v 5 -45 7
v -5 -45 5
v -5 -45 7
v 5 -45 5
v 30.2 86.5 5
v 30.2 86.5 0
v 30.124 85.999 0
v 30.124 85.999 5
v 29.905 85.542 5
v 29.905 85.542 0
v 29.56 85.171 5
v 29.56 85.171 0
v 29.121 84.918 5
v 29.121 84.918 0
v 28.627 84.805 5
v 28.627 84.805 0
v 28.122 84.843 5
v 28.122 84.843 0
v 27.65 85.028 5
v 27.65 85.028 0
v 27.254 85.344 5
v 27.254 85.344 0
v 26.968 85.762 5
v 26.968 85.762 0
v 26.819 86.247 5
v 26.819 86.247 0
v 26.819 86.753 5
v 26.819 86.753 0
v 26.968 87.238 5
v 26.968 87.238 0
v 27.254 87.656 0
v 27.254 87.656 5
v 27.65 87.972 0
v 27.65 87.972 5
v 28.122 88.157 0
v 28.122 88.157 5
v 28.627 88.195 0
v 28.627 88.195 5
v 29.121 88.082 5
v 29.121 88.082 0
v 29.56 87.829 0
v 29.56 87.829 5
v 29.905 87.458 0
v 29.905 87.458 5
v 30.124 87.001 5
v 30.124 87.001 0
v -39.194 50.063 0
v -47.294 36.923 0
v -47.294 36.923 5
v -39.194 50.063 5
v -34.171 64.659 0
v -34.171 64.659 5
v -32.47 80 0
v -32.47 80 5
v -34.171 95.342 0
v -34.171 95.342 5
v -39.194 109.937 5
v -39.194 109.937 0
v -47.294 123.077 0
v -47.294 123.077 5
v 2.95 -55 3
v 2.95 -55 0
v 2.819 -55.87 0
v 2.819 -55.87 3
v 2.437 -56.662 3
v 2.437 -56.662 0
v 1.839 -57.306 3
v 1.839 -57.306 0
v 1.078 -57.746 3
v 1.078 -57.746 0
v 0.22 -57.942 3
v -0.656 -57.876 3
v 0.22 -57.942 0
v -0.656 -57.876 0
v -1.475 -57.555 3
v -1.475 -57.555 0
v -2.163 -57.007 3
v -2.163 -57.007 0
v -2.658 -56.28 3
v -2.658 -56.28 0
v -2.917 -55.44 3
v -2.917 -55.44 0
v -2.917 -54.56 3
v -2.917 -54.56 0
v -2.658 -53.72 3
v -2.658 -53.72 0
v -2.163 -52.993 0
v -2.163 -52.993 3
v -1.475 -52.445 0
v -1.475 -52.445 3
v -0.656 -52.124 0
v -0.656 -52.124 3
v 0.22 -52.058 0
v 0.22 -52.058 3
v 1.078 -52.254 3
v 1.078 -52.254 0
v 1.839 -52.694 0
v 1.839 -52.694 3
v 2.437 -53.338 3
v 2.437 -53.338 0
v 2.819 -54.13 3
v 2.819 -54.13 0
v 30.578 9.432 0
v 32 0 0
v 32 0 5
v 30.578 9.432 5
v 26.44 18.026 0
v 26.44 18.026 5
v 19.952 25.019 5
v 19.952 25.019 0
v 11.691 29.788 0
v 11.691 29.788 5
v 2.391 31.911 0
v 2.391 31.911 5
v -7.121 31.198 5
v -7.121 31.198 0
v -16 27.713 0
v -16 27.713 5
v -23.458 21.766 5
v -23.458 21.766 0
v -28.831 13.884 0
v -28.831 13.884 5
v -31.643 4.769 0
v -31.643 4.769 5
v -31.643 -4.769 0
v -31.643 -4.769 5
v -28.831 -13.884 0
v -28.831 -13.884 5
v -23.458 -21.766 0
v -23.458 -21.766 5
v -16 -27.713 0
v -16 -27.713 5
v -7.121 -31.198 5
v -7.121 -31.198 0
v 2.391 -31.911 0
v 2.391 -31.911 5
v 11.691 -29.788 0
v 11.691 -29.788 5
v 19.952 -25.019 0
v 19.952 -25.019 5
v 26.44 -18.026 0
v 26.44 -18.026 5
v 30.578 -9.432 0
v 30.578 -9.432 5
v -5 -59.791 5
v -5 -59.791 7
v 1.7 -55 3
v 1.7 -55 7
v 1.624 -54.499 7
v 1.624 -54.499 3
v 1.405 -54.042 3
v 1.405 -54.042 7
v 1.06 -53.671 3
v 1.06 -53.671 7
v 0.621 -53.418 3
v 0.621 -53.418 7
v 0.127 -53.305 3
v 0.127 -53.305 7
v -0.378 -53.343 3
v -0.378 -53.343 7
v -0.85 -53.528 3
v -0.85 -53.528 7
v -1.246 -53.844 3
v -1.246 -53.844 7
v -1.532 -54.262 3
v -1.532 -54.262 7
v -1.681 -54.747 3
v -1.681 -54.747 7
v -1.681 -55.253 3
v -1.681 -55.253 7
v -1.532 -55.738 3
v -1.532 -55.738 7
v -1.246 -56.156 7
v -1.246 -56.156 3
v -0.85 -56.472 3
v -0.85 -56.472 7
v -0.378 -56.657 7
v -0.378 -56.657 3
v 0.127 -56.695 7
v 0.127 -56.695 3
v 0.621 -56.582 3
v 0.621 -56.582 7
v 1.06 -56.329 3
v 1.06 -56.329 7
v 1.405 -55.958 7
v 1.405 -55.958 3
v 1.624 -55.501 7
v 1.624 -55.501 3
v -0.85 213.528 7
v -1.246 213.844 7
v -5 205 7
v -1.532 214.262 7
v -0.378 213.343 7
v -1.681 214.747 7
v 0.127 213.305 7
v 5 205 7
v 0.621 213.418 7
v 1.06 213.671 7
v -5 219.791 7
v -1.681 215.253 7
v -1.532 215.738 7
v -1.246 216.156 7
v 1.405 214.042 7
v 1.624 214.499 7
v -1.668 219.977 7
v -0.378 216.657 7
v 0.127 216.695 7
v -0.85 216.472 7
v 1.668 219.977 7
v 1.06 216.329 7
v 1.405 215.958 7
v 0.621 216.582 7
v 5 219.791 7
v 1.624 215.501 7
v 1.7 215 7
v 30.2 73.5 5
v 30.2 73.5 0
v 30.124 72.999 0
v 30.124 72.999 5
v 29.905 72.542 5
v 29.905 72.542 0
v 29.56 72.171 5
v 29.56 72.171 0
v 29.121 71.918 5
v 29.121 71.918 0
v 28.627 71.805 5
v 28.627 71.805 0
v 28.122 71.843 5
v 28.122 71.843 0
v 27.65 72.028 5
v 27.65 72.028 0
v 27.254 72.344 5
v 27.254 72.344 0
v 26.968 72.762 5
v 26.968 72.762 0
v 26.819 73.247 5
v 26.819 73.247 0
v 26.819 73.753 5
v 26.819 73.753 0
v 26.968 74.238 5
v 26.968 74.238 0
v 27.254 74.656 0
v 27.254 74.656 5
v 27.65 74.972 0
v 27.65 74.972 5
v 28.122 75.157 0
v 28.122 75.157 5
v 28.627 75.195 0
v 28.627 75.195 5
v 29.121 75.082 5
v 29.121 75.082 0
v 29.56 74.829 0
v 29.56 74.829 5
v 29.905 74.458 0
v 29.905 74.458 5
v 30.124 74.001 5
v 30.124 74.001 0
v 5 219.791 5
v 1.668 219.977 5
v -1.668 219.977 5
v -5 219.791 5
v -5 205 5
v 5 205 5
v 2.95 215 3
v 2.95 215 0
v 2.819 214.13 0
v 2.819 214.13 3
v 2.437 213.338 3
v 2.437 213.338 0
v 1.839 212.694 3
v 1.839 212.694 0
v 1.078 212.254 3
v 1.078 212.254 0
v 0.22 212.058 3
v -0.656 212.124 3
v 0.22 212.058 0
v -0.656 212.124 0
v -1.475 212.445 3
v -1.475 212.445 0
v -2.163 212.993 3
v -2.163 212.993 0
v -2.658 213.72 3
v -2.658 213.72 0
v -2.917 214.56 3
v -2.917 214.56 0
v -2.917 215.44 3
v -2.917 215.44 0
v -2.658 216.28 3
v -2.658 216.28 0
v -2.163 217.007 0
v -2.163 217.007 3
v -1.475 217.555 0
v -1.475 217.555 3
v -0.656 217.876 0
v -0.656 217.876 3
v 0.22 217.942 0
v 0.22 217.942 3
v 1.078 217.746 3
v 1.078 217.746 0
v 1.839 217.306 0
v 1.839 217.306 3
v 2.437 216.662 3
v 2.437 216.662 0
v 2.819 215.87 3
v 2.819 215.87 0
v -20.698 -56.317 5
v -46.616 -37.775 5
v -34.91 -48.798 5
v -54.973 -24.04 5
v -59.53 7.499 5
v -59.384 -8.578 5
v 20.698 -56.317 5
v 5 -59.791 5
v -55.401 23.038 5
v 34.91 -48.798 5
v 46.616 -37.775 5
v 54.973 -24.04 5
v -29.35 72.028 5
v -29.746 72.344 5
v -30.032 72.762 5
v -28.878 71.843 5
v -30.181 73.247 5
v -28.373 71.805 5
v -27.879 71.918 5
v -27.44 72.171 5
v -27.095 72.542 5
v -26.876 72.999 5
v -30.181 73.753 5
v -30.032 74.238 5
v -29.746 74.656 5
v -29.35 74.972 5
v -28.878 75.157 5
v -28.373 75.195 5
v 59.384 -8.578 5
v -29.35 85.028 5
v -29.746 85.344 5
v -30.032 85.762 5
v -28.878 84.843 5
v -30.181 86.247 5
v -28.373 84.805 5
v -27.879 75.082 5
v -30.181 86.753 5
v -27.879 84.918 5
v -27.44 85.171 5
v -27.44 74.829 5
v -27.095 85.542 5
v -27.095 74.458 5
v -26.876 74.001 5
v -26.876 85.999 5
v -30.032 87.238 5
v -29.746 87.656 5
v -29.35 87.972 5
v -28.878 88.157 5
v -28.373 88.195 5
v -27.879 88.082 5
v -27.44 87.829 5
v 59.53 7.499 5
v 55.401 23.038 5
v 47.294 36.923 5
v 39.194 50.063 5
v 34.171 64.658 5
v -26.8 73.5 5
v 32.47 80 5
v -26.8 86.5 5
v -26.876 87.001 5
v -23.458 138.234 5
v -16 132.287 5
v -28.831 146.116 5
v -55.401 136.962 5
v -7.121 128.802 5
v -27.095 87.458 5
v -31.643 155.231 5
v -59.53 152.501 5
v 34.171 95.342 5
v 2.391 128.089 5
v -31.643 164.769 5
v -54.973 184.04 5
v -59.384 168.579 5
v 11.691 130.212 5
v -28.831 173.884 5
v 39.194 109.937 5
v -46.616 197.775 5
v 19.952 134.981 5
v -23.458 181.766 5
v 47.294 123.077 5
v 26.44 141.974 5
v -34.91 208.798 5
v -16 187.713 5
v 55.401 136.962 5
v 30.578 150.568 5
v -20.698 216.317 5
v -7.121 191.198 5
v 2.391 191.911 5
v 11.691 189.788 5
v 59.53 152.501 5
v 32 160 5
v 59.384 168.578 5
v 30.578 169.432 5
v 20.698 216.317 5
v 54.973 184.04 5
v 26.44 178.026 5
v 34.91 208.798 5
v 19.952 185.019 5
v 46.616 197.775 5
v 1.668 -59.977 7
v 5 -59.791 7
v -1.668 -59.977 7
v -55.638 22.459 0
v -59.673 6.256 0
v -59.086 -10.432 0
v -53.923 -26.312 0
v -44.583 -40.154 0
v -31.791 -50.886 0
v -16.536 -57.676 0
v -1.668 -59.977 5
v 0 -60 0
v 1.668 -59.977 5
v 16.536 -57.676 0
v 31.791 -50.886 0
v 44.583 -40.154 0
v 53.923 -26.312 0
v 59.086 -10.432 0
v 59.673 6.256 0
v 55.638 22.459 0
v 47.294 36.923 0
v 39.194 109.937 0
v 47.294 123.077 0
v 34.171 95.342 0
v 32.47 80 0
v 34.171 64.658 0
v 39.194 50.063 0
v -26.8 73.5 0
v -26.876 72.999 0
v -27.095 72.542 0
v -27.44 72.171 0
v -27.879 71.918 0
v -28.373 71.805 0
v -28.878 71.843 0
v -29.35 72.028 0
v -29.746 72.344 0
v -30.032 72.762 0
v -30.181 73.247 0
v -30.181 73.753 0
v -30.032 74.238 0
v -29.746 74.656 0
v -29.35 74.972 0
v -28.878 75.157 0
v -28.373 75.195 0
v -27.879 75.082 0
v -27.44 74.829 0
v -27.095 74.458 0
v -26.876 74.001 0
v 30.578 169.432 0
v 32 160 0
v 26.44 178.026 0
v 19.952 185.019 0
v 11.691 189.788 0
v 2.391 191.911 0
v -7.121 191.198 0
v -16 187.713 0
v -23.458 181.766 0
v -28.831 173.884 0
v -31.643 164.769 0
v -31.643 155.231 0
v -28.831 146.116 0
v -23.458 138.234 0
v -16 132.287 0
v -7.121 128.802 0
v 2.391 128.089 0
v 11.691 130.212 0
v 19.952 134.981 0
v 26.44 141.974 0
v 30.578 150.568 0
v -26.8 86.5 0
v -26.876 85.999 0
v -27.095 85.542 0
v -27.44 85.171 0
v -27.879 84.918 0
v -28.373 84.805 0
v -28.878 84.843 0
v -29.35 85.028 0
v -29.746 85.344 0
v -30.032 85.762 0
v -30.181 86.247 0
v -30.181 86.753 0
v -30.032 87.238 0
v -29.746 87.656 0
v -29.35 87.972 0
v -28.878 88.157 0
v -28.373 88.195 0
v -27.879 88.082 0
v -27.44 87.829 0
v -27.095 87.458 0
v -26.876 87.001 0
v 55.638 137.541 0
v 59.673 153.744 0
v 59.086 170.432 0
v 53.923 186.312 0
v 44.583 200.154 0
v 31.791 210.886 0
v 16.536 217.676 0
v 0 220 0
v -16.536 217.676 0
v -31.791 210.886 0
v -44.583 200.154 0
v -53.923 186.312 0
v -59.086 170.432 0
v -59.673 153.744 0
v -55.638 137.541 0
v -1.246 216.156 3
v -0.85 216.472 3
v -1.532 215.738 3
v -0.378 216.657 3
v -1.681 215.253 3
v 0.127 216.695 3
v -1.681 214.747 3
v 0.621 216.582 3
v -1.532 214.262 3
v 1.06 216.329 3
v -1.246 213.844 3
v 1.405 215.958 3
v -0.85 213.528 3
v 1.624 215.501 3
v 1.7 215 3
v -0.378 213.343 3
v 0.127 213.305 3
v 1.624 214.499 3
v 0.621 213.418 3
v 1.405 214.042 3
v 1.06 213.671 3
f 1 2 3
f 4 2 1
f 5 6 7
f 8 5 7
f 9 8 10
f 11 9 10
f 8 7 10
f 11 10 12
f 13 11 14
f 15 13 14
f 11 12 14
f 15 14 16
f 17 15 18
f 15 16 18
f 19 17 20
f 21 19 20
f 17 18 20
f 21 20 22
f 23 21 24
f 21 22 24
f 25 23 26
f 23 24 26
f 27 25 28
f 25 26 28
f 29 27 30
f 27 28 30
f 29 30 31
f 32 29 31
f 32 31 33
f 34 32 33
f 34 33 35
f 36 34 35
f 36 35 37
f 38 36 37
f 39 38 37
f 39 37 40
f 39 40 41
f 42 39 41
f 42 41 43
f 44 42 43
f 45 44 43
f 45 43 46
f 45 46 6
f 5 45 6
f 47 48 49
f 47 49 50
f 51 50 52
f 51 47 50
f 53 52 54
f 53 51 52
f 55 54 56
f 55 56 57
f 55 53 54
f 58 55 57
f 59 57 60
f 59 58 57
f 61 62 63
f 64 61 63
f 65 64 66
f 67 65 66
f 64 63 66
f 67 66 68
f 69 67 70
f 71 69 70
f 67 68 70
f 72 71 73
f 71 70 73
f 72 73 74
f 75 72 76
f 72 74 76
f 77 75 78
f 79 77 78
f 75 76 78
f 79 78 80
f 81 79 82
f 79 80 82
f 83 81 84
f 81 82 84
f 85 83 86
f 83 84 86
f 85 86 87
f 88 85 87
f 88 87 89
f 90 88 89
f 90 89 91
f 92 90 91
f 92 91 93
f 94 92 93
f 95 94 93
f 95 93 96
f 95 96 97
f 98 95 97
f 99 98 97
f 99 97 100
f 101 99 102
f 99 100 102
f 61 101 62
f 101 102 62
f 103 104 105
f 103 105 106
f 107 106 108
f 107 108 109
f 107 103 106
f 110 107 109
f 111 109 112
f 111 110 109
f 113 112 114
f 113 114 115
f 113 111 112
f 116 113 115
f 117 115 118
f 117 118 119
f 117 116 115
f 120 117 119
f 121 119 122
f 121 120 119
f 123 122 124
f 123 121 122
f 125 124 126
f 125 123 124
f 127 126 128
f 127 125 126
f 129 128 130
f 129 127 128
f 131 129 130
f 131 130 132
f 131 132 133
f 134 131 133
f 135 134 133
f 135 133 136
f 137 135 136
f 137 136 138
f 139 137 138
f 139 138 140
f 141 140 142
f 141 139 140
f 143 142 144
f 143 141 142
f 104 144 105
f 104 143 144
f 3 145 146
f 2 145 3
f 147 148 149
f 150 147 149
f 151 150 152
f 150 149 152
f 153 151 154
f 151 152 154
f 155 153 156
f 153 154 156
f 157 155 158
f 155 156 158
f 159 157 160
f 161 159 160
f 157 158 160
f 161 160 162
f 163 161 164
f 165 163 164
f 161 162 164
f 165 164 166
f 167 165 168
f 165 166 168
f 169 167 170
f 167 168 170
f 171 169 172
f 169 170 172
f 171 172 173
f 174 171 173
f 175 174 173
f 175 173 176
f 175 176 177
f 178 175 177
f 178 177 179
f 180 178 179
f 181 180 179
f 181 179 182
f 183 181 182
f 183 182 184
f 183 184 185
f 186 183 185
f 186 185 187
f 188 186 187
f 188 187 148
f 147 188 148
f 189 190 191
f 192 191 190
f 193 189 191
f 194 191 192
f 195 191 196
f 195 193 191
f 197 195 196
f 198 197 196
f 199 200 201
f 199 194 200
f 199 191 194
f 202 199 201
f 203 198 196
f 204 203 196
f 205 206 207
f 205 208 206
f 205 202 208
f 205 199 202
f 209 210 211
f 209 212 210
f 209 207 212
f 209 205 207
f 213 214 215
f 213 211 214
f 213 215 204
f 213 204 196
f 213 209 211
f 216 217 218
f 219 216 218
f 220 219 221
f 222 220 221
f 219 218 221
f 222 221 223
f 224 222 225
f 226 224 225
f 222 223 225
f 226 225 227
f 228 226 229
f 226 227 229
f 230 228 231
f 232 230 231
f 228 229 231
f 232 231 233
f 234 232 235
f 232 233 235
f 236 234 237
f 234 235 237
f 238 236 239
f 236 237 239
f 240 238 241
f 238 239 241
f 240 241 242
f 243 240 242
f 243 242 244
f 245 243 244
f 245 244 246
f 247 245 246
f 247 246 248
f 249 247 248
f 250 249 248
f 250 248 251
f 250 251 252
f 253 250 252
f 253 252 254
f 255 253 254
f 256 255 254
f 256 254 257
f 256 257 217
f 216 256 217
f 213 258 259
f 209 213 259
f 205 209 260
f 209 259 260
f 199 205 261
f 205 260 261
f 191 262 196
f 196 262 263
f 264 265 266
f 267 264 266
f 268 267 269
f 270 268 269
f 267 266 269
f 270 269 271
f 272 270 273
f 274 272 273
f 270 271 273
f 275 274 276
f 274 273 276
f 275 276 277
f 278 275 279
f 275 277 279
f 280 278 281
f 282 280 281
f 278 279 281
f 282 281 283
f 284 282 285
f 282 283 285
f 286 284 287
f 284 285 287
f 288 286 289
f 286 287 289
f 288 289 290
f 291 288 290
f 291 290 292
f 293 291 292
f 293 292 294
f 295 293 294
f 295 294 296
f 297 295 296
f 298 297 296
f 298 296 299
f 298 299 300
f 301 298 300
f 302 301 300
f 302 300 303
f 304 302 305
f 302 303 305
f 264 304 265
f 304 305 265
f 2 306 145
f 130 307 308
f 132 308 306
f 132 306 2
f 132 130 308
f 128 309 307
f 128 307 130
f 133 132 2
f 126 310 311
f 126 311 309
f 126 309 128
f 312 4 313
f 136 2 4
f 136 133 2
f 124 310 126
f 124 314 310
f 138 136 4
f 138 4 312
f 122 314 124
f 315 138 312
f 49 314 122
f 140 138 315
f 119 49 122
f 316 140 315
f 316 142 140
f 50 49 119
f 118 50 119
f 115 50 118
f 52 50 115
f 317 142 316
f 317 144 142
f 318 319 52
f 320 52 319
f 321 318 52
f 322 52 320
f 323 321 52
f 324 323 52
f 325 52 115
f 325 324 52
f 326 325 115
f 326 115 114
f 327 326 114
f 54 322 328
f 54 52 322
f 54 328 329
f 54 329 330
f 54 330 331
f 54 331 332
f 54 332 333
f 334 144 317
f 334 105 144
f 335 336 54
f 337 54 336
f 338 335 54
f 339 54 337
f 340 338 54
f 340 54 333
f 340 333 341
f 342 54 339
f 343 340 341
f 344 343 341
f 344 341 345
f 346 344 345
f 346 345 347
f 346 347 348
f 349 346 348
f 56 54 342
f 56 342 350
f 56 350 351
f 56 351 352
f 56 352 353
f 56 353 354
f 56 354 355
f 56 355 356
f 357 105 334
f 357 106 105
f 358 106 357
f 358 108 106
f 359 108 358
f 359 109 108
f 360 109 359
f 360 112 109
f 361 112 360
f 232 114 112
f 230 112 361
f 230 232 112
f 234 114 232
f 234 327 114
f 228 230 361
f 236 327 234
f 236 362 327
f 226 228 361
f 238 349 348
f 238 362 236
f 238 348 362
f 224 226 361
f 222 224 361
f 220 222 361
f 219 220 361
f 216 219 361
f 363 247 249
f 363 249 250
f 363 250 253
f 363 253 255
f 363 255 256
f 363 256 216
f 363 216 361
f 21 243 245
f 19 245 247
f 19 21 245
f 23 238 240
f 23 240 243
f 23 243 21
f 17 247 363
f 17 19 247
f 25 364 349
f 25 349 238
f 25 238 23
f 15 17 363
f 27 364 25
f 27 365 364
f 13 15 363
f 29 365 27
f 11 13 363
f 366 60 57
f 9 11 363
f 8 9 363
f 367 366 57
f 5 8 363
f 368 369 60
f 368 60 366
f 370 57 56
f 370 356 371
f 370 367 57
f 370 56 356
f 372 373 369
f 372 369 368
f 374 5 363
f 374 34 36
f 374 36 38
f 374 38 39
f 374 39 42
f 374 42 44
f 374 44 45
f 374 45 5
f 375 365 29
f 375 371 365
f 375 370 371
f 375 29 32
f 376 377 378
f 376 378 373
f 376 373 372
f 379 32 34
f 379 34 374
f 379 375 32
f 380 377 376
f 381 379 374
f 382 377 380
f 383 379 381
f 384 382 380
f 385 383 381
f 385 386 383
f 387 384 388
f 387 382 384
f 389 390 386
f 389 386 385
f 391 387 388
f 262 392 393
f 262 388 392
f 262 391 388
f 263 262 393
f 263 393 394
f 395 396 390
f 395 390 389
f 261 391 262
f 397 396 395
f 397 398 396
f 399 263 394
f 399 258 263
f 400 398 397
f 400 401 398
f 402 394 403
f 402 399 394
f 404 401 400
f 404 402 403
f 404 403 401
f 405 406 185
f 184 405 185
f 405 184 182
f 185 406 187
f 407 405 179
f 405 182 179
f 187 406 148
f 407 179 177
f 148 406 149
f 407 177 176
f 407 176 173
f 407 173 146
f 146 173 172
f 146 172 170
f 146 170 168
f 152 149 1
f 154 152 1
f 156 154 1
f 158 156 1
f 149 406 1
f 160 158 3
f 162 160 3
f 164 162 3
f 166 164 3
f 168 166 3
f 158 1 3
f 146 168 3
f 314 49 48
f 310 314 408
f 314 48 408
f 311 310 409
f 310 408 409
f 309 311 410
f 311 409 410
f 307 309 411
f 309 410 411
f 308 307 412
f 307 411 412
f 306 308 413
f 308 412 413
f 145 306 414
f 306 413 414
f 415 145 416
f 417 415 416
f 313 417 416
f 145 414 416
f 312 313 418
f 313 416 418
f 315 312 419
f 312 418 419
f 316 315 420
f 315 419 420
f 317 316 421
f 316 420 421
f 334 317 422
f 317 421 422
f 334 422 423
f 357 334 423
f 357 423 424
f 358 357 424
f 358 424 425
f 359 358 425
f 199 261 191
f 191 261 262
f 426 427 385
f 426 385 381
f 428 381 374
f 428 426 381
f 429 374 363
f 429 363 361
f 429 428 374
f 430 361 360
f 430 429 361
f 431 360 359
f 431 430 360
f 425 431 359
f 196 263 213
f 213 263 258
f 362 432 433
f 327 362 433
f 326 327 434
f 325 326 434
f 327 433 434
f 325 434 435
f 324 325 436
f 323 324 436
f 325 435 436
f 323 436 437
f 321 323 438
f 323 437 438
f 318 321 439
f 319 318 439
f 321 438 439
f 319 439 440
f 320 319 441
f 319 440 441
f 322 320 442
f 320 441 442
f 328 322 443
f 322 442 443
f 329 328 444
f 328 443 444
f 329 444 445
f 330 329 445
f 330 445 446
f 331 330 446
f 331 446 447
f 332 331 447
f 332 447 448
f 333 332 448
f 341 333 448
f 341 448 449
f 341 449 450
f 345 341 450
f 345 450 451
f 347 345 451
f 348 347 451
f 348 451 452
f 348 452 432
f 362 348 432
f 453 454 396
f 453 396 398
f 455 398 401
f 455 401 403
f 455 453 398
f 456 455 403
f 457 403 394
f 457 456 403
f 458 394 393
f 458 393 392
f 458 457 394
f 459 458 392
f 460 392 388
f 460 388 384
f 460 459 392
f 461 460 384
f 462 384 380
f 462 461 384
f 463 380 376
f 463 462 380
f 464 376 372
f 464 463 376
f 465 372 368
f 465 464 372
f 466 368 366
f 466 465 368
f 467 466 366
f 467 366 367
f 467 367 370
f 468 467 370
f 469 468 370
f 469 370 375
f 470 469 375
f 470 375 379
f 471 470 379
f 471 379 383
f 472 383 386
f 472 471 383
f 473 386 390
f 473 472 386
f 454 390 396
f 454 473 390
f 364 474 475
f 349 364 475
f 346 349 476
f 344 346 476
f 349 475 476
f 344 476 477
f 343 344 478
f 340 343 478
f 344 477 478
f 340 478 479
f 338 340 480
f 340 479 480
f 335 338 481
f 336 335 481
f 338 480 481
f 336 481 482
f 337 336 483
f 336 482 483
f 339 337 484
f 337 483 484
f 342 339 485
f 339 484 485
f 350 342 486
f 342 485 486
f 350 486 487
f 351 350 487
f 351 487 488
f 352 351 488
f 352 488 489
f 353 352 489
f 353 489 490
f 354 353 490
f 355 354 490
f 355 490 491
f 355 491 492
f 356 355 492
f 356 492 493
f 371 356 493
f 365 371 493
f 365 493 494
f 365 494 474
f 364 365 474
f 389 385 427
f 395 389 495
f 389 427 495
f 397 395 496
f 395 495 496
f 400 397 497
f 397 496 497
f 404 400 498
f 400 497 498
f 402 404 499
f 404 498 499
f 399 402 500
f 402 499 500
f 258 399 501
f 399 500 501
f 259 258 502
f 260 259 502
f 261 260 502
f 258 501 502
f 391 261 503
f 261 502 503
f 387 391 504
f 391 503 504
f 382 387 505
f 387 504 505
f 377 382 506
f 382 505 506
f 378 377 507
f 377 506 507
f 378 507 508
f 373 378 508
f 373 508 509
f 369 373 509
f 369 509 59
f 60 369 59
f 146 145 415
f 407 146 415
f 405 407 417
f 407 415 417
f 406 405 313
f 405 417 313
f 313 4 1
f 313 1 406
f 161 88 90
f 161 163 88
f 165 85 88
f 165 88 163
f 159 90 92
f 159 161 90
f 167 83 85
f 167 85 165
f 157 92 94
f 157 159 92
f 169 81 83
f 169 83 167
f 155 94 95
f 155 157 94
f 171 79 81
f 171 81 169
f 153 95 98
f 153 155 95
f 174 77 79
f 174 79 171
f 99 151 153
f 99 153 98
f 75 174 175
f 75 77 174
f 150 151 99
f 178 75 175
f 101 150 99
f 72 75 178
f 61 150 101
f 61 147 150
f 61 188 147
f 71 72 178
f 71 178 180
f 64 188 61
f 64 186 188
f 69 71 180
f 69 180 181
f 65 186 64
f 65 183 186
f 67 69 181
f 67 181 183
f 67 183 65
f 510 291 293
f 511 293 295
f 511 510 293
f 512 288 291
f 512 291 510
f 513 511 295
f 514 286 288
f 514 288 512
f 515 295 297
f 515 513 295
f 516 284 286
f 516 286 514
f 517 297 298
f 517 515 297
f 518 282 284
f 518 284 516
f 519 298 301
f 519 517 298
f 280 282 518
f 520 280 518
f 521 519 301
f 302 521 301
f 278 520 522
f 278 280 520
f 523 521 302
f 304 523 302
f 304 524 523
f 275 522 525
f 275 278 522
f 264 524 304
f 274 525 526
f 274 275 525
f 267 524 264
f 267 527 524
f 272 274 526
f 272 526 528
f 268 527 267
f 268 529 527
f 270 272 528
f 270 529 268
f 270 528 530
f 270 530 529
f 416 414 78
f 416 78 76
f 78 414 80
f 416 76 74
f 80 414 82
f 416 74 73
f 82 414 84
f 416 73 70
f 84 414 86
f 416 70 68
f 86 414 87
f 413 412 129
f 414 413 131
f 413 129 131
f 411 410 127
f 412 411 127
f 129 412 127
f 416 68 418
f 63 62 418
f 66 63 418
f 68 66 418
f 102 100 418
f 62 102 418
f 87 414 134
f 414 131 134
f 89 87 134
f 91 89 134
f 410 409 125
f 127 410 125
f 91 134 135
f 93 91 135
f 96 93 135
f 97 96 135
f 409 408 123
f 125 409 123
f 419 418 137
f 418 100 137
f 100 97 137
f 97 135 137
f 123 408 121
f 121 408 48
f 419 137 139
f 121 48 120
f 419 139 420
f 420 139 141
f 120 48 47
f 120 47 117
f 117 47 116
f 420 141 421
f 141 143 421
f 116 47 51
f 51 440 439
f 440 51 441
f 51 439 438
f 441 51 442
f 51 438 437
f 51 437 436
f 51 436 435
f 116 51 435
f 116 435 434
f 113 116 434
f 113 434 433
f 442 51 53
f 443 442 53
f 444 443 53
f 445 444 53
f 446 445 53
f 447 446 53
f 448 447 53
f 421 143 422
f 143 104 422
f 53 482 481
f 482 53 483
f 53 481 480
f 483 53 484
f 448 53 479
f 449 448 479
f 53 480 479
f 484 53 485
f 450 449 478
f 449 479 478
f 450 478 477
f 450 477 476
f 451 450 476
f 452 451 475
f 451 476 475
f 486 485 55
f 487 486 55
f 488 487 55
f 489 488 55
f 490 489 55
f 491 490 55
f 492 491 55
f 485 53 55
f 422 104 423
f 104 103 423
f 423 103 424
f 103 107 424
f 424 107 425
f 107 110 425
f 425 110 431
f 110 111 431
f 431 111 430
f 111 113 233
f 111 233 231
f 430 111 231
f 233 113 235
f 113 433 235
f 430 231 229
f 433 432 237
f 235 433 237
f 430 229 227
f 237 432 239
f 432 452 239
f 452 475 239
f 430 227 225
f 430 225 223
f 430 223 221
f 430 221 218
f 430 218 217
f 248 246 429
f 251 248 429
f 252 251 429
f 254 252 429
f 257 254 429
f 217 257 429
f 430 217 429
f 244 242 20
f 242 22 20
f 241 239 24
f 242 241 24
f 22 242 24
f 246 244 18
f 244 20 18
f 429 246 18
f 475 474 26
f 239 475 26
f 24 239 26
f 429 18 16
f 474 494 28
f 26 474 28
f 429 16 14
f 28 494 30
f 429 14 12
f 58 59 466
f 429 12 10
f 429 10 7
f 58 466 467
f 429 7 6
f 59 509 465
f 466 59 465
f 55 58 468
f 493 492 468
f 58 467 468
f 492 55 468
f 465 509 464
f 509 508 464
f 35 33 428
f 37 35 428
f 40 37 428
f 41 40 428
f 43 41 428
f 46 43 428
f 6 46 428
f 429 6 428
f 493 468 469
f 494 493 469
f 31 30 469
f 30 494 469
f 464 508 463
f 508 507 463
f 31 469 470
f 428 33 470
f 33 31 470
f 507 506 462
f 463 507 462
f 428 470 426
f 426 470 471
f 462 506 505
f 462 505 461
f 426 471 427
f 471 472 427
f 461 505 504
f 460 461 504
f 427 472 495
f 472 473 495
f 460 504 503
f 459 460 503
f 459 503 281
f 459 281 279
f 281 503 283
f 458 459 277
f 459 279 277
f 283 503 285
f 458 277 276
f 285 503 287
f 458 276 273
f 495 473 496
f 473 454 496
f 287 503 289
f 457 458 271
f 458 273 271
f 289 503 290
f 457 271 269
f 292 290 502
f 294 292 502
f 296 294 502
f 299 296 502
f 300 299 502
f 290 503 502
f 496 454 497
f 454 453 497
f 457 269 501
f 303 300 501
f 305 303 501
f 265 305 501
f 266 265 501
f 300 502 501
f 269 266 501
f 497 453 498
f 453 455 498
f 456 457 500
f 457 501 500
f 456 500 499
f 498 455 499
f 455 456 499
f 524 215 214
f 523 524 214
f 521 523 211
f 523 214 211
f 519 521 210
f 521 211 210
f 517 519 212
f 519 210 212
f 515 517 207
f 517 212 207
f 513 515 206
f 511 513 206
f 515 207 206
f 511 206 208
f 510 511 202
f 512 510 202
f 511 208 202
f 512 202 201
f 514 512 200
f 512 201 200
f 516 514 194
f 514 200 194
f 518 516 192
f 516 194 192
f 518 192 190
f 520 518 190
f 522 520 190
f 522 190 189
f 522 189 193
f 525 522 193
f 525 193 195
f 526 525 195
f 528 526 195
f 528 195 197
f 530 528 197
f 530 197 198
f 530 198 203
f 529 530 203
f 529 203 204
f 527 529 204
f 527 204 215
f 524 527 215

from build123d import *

# Parameters (mm, degrees)
SKETCH_R        = 32
PAD_DEPTH       = 5
PAD001_DEPTH    = 2
SKETCH002_R     = 1.7
POCKET_DEPTH    = 7.001
SKETCH003_R     = 2.95
POCKET001_DEPTH = 3
SKETCH004_R     = 1.7
POCKET002_DEPTH = 7.001


with BuildPart() as part:
    # Sketch → Pad (new body)
    with BuildSketch(Plane.XY):
        with BuildLine():
            ThreePointArc((-47.293619, 36.923077), (0, -60), (47.293619, 36.923077))
            ThreePointArc((47.293619, 123.076923), (32.469508, 80), (47.293619, 36.923077))
            ThreePointArc((47.293619, 123.076923), (3.1e-05, 220), (-47.293657, 123.076972))
            ThreePointArc((-47.293619, 36.923077), (-32.469508, 80.000031), (-47.293657, 123.076972))
        make_face()
        Circle(SKETCH_R, mode=Mode.SUBTRACT)
        with Locations((0, 160)):
            Circle(SKETCH_R, mode=Mode.SUBTRACT)
    extrude(amount=PAD_DEPTH)

    # Sketch001 (on Face8 of Pad) → Pad001 (join)
    with BuildSketch(Plane.XY.offset(5)):
        with BuildLine():
            Line((-5, -59.791304), (-5, -45))
            Line((-5, -45), (5, -45))
            Line((5, -45), (5, -59.791304))
            ThreePointArc((-5, -59.791304), (0, -60), (5, -59.791304))
        make_face()
        with BuildLine():
            ThreePointArc((5, 219.791304), (0, 220), (-5, 219.791304))
            Line((-5, 219.791304), (-5, 205))
            Line((-5, 205), (5, 205))
            Line((5, 205), (5, 219.791304))
        make_face()
    extrude(amount=PAD001_DEPTH)

    # Sketch002 (on Face14 of Pad001) → Pocket (cut, through all)
    with BuildSketch(Plane.XY.offset(7)):
        with Locations((0, -55)):
            Circle(SKETCH002_R)
        with Locations((0, 215)):
            Circle(SKETCH002_R)
    extrude(amount=-POCKET_DEPTH, mode=Mode.SUBTRACT)

    # Sketch003 (on Face4 of Pocket) → Pocket001 (cut)
    with BuildSketch(Plane(origin=(0, 0, 0), x_dir=(1, 0, 0), z_dir=(0, 0, -1))):
        with Locations((0, 55)):
            Circle(SKETCH003_R)
        with Locations((0, -215)):
            Circle(SKETCH003_R)
    extrude(amount=-POCKET001_DEPTH, mode=Mode.SUBTRACT)

    # Sketch004 (on Face4 of Pocket001) → Pocket002 (cut, through all)
    with BuildSketch(Plane(origin=(0, 0, 0), x_dir=(1, 0, 0), z_dir=(0, 0, -1))):
        with Locations((28.5, -73.5)):
            Circle(SKETCH004_R)
        with Locations((28.5, -86.5)):
            Circle(SKETCH004_R)
        with Locations((-28.5, -86.5)):
            Circle(SKETCH004_R)
        with Locations((-28.5, -73.5)):
            Circle(SKETCH004_R)
    extrude(amount=-POCKET002_DEPTH, mode=Mode.SUBTRACT)


solid = part.part
